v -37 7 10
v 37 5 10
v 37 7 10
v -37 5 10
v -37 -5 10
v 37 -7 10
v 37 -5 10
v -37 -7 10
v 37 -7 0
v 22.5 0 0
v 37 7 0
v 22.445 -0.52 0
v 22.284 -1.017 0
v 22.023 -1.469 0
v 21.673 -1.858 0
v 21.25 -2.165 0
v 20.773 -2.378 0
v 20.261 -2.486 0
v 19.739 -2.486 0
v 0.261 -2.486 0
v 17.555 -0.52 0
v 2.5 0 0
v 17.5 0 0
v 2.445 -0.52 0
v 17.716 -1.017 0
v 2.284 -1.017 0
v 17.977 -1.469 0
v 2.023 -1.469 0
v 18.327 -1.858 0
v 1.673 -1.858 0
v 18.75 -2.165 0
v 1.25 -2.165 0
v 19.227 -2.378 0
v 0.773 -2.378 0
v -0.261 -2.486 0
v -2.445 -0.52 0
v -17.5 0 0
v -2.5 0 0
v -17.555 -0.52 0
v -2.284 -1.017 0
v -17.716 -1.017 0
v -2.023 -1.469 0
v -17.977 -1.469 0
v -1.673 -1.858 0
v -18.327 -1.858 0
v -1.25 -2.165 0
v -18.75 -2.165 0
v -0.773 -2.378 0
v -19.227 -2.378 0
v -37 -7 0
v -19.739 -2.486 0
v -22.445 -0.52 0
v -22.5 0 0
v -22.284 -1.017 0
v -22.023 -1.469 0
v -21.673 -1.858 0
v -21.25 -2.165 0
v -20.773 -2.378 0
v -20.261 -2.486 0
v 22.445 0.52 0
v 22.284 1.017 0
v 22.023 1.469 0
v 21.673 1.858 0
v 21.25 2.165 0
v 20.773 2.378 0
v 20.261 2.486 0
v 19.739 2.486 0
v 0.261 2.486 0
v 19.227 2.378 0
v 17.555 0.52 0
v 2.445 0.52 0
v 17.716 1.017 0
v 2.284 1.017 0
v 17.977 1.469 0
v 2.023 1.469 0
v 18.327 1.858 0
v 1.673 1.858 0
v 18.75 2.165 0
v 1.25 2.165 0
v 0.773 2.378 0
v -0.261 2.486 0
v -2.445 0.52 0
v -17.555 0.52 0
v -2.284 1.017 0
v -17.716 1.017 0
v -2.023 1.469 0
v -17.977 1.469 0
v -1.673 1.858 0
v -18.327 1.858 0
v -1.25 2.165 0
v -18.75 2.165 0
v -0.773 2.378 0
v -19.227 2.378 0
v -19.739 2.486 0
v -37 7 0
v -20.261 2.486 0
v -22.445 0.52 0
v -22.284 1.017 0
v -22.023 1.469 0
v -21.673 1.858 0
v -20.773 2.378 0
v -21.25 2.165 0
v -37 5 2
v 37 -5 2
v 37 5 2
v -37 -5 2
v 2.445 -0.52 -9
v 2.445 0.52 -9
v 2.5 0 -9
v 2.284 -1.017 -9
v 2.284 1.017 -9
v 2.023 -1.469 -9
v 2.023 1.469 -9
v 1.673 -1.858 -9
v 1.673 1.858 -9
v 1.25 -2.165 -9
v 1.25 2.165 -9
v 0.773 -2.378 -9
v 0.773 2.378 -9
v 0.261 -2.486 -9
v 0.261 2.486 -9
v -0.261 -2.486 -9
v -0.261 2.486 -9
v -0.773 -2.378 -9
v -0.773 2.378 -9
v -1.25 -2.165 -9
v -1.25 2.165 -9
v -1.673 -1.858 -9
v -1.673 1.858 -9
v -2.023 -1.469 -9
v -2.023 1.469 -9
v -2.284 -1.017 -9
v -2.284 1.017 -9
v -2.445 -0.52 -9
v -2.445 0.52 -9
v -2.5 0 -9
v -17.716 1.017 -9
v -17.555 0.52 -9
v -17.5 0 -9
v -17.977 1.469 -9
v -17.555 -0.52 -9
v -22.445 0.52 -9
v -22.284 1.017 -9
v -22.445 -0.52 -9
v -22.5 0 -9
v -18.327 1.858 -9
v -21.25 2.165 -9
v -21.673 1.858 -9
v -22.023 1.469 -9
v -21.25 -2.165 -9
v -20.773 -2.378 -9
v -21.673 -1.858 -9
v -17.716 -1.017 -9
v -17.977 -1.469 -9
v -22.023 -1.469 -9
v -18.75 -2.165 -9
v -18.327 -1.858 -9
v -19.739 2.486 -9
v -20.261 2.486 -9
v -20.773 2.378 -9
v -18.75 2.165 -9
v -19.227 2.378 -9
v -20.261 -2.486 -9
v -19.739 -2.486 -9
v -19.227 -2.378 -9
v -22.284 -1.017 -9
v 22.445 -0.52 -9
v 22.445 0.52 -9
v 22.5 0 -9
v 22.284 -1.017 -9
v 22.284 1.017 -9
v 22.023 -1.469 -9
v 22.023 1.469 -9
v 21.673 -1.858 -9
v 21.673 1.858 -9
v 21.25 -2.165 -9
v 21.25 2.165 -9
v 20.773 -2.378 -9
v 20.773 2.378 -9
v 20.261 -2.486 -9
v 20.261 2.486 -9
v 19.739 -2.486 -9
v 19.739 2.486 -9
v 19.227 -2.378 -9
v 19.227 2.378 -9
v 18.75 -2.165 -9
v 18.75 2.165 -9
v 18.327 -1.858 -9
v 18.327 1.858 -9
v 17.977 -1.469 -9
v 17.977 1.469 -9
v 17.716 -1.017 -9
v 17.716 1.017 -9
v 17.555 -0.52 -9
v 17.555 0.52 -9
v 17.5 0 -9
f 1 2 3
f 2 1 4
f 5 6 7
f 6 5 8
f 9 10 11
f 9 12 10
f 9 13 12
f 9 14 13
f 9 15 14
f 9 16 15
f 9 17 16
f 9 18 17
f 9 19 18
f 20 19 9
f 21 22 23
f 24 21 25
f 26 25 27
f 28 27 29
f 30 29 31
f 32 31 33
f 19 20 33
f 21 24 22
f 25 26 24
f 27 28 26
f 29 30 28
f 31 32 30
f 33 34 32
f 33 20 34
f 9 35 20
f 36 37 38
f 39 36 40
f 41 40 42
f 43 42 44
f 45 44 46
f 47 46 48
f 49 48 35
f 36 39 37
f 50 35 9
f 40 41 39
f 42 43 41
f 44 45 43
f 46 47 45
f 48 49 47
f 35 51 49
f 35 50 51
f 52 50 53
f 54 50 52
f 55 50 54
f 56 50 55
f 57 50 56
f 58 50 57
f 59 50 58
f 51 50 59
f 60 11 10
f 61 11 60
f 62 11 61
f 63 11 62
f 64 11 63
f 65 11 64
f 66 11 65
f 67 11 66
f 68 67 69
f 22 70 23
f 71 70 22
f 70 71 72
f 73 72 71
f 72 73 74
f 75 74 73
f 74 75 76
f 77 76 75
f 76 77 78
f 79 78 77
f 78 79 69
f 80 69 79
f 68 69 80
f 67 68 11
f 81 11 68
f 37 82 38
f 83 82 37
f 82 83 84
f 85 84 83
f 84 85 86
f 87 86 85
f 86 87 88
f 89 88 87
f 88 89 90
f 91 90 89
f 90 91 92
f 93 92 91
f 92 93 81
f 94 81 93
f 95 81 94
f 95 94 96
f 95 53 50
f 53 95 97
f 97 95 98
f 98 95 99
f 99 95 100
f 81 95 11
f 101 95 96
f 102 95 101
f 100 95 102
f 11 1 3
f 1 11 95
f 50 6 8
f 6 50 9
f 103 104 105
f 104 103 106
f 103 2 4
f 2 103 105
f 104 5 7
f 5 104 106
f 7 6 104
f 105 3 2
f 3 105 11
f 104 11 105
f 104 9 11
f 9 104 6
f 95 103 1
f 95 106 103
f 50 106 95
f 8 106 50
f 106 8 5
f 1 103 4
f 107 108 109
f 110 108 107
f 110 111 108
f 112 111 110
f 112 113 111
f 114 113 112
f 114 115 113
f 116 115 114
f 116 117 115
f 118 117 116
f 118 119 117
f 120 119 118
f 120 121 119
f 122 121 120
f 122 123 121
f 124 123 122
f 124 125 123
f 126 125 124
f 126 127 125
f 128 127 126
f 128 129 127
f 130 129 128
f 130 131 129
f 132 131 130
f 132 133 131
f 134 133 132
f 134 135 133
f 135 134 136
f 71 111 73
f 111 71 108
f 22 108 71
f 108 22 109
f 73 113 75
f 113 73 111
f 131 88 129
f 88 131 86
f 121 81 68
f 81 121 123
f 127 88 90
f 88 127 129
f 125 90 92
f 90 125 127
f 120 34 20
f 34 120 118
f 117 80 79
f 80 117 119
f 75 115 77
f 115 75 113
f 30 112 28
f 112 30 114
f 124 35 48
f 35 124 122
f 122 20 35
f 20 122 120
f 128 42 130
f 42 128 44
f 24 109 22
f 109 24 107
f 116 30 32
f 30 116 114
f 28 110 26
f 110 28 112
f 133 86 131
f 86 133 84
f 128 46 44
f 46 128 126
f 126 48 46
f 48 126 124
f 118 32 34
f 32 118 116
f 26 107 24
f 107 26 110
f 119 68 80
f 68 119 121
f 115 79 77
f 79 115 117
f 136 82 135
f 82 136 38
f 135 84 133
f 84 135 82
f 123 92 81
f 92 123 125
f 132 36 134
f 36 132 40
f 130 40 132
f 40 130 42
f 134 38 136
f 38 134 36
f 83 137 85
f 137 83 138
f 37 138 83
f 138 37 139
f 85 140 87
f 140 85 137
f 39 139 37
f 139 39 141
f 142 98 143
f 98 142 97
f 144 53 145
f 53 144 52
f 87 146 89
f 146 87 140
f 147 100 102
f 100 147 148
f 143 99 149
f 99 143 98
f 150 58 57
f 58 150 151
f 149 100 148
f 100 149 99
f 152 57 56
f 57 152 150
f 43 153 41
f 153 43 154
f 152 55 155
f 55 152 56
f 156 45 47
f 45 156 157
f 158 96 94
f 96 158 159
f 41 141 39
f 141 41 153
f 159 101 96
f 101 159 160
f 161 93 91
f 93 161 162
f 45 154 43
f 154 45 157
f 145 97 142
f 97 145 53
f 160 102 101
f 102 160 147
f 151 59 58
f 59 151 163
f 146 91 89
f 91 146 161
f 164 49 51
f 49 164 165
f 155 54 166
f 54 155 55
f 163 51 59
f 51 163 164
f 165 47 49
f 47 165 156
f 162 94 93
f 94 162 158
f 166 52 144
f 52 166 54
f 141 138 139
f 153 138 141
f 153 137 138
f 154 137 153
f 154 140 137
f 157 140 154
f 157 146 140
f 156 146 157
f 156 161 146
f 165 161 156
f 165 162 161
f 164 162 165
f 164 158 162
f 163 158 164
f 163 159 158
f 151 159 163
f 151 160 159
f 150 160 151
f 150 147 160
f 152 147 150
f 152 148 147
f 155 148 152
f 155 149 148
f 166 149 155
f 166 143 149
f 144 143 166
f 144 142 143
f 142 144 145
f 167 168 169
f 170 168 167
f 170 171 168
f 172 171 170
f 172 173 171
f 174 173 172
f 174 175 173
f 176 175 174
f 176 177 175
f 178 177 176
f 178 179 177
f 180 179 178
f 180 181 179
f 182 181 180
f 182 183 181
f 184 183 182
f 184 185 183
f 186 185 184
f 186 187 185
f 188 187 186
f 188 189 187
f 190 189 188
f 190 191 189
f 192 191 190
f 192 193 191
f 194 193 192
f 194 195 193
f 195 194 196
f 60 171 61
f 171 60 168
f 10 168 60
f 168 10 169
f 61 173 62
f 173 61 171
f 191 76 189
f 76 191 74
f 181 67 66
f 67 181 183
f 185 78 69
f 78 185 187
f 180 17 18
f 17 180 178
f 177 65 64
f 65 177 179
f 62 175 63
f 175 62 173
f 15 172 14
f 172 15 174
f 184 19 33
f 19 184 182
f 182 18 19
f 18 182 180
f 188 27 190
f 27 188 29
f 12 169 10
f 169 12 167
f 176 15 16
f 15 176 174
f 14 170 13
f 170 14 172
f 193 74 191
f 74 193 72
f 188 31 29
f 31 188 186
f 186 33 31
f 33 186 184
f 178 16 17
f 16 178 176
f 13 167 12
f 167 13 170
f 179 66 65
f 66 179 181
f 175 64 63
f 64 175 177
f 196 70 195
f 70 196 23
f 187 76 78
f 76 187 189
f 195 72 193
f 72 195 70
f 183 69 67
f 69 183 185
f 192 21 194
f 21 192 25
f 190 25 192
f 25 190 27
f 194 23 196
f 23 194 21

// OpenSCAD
// Прямой паз с шипами для вставки в основание
// Модульная конструкция: центральное основание + 2 рукава (лево-право) + шипы

// Параметры (все размеры в мм)
center_size = 10;     // Размер центрального квадрата (внутри)
sleeve_length = 30;   // Длина рукава
groove_width = 10;    // Ширина паза (внутри) - для фанеры 9.3мм
wall_height = 10;     // Высота стенок
wall_thickness = 2;   // Толщина стенок

// Параметры шипов
dowel_diameter = 5;   // Диаметр шипа
dowel_depth = 9;      // Глубина шипа (высота)
dowel_spacing = 20;   // Шаг между шипами

// Вычисляемые размеры
total_width = groove_width + 2 * wall_thickness;  // 14 мм
center_total = center_size + 2 * wall_thickness;  // 14 мм

// 1. Метод: нарисовать основание
module draw_base() {
    difference() {
        cube([center_total, center_total, wall_height]);
        translate([wall_thickness, wall_thickness, wall_thickness])
            cube([center_size, center_size, wall_height]);
    }
}

// Модуль для создания одного рукава
module single_sleeve() {
    difference() {
        cube([sleeve_length, total_width, wall_height]);
        translate([0, wall_thickness, wall_thickness])
            cube([sleeve_length, groove_width, wall_height]);
    }
}

// Метод: вырезать отверстие в стенке основания
module cut_wall_opening(side) {
    if (side == 0) {
        translate([center_total - wall_thickness - 0.1, wall_thickness, wall_thickness])
            cube([wall_thickness + 0.2, groove_width, wall_height]);
    } else if (side == 2) {
        translate([-0.1, wall_thickness, wall_thickness])
            cube([wall_thickness + 0.2, groove_width, wall_height]);
    }
}

// 2. Метод: прицепить рукав к основанию
module attach_sleeve(side) {
    if (side == 0) {
        translate([center_total, center_total/2 - total_width/2, 0])
            single_sleeve();
    } else if (side == 2) {
        translate([-sleeve_length, center_total/2 - total_width/2, 0])
            single_sleeve();
    }
}

// 3. Метод: добавить шип в позиции (x, y)
module add_dowel(x, y) {
    translate([x, y, -dowel_depth])
        cylinder(h=dowel_depth, d=dowel_diameter, $fn=30);
}

// Собираем прямую конструкцию с шипами
translate([-center_total/2, -center_total/2, 0]) {
    union() {
        difference() {
            draw_base();
            cut_wall_opening(0);  // Право
            cut_wall_opening(2);  // Лево
        }
        attach_sleeve(0);  // Право
        attach_sleeve(2);  // Лево

        // Шипы: центр + лево/право
        add_dowel(center_total/2, center_total/2);                    // Центр
        add_dowel(center_total/2 - dowel_spacing, center_total/2);   // Лево
        add_dowel(center_total/2 + dowel_spacing, center_total/2);   // Право
    }
}

// Информация для проверки
echo("=== Размеры прямого паза с шипами ===");
echo("Количество шипов: 3 (центр + лево/право)");
echo("Шаг между шипами:", dowel_spacing, "мм");
